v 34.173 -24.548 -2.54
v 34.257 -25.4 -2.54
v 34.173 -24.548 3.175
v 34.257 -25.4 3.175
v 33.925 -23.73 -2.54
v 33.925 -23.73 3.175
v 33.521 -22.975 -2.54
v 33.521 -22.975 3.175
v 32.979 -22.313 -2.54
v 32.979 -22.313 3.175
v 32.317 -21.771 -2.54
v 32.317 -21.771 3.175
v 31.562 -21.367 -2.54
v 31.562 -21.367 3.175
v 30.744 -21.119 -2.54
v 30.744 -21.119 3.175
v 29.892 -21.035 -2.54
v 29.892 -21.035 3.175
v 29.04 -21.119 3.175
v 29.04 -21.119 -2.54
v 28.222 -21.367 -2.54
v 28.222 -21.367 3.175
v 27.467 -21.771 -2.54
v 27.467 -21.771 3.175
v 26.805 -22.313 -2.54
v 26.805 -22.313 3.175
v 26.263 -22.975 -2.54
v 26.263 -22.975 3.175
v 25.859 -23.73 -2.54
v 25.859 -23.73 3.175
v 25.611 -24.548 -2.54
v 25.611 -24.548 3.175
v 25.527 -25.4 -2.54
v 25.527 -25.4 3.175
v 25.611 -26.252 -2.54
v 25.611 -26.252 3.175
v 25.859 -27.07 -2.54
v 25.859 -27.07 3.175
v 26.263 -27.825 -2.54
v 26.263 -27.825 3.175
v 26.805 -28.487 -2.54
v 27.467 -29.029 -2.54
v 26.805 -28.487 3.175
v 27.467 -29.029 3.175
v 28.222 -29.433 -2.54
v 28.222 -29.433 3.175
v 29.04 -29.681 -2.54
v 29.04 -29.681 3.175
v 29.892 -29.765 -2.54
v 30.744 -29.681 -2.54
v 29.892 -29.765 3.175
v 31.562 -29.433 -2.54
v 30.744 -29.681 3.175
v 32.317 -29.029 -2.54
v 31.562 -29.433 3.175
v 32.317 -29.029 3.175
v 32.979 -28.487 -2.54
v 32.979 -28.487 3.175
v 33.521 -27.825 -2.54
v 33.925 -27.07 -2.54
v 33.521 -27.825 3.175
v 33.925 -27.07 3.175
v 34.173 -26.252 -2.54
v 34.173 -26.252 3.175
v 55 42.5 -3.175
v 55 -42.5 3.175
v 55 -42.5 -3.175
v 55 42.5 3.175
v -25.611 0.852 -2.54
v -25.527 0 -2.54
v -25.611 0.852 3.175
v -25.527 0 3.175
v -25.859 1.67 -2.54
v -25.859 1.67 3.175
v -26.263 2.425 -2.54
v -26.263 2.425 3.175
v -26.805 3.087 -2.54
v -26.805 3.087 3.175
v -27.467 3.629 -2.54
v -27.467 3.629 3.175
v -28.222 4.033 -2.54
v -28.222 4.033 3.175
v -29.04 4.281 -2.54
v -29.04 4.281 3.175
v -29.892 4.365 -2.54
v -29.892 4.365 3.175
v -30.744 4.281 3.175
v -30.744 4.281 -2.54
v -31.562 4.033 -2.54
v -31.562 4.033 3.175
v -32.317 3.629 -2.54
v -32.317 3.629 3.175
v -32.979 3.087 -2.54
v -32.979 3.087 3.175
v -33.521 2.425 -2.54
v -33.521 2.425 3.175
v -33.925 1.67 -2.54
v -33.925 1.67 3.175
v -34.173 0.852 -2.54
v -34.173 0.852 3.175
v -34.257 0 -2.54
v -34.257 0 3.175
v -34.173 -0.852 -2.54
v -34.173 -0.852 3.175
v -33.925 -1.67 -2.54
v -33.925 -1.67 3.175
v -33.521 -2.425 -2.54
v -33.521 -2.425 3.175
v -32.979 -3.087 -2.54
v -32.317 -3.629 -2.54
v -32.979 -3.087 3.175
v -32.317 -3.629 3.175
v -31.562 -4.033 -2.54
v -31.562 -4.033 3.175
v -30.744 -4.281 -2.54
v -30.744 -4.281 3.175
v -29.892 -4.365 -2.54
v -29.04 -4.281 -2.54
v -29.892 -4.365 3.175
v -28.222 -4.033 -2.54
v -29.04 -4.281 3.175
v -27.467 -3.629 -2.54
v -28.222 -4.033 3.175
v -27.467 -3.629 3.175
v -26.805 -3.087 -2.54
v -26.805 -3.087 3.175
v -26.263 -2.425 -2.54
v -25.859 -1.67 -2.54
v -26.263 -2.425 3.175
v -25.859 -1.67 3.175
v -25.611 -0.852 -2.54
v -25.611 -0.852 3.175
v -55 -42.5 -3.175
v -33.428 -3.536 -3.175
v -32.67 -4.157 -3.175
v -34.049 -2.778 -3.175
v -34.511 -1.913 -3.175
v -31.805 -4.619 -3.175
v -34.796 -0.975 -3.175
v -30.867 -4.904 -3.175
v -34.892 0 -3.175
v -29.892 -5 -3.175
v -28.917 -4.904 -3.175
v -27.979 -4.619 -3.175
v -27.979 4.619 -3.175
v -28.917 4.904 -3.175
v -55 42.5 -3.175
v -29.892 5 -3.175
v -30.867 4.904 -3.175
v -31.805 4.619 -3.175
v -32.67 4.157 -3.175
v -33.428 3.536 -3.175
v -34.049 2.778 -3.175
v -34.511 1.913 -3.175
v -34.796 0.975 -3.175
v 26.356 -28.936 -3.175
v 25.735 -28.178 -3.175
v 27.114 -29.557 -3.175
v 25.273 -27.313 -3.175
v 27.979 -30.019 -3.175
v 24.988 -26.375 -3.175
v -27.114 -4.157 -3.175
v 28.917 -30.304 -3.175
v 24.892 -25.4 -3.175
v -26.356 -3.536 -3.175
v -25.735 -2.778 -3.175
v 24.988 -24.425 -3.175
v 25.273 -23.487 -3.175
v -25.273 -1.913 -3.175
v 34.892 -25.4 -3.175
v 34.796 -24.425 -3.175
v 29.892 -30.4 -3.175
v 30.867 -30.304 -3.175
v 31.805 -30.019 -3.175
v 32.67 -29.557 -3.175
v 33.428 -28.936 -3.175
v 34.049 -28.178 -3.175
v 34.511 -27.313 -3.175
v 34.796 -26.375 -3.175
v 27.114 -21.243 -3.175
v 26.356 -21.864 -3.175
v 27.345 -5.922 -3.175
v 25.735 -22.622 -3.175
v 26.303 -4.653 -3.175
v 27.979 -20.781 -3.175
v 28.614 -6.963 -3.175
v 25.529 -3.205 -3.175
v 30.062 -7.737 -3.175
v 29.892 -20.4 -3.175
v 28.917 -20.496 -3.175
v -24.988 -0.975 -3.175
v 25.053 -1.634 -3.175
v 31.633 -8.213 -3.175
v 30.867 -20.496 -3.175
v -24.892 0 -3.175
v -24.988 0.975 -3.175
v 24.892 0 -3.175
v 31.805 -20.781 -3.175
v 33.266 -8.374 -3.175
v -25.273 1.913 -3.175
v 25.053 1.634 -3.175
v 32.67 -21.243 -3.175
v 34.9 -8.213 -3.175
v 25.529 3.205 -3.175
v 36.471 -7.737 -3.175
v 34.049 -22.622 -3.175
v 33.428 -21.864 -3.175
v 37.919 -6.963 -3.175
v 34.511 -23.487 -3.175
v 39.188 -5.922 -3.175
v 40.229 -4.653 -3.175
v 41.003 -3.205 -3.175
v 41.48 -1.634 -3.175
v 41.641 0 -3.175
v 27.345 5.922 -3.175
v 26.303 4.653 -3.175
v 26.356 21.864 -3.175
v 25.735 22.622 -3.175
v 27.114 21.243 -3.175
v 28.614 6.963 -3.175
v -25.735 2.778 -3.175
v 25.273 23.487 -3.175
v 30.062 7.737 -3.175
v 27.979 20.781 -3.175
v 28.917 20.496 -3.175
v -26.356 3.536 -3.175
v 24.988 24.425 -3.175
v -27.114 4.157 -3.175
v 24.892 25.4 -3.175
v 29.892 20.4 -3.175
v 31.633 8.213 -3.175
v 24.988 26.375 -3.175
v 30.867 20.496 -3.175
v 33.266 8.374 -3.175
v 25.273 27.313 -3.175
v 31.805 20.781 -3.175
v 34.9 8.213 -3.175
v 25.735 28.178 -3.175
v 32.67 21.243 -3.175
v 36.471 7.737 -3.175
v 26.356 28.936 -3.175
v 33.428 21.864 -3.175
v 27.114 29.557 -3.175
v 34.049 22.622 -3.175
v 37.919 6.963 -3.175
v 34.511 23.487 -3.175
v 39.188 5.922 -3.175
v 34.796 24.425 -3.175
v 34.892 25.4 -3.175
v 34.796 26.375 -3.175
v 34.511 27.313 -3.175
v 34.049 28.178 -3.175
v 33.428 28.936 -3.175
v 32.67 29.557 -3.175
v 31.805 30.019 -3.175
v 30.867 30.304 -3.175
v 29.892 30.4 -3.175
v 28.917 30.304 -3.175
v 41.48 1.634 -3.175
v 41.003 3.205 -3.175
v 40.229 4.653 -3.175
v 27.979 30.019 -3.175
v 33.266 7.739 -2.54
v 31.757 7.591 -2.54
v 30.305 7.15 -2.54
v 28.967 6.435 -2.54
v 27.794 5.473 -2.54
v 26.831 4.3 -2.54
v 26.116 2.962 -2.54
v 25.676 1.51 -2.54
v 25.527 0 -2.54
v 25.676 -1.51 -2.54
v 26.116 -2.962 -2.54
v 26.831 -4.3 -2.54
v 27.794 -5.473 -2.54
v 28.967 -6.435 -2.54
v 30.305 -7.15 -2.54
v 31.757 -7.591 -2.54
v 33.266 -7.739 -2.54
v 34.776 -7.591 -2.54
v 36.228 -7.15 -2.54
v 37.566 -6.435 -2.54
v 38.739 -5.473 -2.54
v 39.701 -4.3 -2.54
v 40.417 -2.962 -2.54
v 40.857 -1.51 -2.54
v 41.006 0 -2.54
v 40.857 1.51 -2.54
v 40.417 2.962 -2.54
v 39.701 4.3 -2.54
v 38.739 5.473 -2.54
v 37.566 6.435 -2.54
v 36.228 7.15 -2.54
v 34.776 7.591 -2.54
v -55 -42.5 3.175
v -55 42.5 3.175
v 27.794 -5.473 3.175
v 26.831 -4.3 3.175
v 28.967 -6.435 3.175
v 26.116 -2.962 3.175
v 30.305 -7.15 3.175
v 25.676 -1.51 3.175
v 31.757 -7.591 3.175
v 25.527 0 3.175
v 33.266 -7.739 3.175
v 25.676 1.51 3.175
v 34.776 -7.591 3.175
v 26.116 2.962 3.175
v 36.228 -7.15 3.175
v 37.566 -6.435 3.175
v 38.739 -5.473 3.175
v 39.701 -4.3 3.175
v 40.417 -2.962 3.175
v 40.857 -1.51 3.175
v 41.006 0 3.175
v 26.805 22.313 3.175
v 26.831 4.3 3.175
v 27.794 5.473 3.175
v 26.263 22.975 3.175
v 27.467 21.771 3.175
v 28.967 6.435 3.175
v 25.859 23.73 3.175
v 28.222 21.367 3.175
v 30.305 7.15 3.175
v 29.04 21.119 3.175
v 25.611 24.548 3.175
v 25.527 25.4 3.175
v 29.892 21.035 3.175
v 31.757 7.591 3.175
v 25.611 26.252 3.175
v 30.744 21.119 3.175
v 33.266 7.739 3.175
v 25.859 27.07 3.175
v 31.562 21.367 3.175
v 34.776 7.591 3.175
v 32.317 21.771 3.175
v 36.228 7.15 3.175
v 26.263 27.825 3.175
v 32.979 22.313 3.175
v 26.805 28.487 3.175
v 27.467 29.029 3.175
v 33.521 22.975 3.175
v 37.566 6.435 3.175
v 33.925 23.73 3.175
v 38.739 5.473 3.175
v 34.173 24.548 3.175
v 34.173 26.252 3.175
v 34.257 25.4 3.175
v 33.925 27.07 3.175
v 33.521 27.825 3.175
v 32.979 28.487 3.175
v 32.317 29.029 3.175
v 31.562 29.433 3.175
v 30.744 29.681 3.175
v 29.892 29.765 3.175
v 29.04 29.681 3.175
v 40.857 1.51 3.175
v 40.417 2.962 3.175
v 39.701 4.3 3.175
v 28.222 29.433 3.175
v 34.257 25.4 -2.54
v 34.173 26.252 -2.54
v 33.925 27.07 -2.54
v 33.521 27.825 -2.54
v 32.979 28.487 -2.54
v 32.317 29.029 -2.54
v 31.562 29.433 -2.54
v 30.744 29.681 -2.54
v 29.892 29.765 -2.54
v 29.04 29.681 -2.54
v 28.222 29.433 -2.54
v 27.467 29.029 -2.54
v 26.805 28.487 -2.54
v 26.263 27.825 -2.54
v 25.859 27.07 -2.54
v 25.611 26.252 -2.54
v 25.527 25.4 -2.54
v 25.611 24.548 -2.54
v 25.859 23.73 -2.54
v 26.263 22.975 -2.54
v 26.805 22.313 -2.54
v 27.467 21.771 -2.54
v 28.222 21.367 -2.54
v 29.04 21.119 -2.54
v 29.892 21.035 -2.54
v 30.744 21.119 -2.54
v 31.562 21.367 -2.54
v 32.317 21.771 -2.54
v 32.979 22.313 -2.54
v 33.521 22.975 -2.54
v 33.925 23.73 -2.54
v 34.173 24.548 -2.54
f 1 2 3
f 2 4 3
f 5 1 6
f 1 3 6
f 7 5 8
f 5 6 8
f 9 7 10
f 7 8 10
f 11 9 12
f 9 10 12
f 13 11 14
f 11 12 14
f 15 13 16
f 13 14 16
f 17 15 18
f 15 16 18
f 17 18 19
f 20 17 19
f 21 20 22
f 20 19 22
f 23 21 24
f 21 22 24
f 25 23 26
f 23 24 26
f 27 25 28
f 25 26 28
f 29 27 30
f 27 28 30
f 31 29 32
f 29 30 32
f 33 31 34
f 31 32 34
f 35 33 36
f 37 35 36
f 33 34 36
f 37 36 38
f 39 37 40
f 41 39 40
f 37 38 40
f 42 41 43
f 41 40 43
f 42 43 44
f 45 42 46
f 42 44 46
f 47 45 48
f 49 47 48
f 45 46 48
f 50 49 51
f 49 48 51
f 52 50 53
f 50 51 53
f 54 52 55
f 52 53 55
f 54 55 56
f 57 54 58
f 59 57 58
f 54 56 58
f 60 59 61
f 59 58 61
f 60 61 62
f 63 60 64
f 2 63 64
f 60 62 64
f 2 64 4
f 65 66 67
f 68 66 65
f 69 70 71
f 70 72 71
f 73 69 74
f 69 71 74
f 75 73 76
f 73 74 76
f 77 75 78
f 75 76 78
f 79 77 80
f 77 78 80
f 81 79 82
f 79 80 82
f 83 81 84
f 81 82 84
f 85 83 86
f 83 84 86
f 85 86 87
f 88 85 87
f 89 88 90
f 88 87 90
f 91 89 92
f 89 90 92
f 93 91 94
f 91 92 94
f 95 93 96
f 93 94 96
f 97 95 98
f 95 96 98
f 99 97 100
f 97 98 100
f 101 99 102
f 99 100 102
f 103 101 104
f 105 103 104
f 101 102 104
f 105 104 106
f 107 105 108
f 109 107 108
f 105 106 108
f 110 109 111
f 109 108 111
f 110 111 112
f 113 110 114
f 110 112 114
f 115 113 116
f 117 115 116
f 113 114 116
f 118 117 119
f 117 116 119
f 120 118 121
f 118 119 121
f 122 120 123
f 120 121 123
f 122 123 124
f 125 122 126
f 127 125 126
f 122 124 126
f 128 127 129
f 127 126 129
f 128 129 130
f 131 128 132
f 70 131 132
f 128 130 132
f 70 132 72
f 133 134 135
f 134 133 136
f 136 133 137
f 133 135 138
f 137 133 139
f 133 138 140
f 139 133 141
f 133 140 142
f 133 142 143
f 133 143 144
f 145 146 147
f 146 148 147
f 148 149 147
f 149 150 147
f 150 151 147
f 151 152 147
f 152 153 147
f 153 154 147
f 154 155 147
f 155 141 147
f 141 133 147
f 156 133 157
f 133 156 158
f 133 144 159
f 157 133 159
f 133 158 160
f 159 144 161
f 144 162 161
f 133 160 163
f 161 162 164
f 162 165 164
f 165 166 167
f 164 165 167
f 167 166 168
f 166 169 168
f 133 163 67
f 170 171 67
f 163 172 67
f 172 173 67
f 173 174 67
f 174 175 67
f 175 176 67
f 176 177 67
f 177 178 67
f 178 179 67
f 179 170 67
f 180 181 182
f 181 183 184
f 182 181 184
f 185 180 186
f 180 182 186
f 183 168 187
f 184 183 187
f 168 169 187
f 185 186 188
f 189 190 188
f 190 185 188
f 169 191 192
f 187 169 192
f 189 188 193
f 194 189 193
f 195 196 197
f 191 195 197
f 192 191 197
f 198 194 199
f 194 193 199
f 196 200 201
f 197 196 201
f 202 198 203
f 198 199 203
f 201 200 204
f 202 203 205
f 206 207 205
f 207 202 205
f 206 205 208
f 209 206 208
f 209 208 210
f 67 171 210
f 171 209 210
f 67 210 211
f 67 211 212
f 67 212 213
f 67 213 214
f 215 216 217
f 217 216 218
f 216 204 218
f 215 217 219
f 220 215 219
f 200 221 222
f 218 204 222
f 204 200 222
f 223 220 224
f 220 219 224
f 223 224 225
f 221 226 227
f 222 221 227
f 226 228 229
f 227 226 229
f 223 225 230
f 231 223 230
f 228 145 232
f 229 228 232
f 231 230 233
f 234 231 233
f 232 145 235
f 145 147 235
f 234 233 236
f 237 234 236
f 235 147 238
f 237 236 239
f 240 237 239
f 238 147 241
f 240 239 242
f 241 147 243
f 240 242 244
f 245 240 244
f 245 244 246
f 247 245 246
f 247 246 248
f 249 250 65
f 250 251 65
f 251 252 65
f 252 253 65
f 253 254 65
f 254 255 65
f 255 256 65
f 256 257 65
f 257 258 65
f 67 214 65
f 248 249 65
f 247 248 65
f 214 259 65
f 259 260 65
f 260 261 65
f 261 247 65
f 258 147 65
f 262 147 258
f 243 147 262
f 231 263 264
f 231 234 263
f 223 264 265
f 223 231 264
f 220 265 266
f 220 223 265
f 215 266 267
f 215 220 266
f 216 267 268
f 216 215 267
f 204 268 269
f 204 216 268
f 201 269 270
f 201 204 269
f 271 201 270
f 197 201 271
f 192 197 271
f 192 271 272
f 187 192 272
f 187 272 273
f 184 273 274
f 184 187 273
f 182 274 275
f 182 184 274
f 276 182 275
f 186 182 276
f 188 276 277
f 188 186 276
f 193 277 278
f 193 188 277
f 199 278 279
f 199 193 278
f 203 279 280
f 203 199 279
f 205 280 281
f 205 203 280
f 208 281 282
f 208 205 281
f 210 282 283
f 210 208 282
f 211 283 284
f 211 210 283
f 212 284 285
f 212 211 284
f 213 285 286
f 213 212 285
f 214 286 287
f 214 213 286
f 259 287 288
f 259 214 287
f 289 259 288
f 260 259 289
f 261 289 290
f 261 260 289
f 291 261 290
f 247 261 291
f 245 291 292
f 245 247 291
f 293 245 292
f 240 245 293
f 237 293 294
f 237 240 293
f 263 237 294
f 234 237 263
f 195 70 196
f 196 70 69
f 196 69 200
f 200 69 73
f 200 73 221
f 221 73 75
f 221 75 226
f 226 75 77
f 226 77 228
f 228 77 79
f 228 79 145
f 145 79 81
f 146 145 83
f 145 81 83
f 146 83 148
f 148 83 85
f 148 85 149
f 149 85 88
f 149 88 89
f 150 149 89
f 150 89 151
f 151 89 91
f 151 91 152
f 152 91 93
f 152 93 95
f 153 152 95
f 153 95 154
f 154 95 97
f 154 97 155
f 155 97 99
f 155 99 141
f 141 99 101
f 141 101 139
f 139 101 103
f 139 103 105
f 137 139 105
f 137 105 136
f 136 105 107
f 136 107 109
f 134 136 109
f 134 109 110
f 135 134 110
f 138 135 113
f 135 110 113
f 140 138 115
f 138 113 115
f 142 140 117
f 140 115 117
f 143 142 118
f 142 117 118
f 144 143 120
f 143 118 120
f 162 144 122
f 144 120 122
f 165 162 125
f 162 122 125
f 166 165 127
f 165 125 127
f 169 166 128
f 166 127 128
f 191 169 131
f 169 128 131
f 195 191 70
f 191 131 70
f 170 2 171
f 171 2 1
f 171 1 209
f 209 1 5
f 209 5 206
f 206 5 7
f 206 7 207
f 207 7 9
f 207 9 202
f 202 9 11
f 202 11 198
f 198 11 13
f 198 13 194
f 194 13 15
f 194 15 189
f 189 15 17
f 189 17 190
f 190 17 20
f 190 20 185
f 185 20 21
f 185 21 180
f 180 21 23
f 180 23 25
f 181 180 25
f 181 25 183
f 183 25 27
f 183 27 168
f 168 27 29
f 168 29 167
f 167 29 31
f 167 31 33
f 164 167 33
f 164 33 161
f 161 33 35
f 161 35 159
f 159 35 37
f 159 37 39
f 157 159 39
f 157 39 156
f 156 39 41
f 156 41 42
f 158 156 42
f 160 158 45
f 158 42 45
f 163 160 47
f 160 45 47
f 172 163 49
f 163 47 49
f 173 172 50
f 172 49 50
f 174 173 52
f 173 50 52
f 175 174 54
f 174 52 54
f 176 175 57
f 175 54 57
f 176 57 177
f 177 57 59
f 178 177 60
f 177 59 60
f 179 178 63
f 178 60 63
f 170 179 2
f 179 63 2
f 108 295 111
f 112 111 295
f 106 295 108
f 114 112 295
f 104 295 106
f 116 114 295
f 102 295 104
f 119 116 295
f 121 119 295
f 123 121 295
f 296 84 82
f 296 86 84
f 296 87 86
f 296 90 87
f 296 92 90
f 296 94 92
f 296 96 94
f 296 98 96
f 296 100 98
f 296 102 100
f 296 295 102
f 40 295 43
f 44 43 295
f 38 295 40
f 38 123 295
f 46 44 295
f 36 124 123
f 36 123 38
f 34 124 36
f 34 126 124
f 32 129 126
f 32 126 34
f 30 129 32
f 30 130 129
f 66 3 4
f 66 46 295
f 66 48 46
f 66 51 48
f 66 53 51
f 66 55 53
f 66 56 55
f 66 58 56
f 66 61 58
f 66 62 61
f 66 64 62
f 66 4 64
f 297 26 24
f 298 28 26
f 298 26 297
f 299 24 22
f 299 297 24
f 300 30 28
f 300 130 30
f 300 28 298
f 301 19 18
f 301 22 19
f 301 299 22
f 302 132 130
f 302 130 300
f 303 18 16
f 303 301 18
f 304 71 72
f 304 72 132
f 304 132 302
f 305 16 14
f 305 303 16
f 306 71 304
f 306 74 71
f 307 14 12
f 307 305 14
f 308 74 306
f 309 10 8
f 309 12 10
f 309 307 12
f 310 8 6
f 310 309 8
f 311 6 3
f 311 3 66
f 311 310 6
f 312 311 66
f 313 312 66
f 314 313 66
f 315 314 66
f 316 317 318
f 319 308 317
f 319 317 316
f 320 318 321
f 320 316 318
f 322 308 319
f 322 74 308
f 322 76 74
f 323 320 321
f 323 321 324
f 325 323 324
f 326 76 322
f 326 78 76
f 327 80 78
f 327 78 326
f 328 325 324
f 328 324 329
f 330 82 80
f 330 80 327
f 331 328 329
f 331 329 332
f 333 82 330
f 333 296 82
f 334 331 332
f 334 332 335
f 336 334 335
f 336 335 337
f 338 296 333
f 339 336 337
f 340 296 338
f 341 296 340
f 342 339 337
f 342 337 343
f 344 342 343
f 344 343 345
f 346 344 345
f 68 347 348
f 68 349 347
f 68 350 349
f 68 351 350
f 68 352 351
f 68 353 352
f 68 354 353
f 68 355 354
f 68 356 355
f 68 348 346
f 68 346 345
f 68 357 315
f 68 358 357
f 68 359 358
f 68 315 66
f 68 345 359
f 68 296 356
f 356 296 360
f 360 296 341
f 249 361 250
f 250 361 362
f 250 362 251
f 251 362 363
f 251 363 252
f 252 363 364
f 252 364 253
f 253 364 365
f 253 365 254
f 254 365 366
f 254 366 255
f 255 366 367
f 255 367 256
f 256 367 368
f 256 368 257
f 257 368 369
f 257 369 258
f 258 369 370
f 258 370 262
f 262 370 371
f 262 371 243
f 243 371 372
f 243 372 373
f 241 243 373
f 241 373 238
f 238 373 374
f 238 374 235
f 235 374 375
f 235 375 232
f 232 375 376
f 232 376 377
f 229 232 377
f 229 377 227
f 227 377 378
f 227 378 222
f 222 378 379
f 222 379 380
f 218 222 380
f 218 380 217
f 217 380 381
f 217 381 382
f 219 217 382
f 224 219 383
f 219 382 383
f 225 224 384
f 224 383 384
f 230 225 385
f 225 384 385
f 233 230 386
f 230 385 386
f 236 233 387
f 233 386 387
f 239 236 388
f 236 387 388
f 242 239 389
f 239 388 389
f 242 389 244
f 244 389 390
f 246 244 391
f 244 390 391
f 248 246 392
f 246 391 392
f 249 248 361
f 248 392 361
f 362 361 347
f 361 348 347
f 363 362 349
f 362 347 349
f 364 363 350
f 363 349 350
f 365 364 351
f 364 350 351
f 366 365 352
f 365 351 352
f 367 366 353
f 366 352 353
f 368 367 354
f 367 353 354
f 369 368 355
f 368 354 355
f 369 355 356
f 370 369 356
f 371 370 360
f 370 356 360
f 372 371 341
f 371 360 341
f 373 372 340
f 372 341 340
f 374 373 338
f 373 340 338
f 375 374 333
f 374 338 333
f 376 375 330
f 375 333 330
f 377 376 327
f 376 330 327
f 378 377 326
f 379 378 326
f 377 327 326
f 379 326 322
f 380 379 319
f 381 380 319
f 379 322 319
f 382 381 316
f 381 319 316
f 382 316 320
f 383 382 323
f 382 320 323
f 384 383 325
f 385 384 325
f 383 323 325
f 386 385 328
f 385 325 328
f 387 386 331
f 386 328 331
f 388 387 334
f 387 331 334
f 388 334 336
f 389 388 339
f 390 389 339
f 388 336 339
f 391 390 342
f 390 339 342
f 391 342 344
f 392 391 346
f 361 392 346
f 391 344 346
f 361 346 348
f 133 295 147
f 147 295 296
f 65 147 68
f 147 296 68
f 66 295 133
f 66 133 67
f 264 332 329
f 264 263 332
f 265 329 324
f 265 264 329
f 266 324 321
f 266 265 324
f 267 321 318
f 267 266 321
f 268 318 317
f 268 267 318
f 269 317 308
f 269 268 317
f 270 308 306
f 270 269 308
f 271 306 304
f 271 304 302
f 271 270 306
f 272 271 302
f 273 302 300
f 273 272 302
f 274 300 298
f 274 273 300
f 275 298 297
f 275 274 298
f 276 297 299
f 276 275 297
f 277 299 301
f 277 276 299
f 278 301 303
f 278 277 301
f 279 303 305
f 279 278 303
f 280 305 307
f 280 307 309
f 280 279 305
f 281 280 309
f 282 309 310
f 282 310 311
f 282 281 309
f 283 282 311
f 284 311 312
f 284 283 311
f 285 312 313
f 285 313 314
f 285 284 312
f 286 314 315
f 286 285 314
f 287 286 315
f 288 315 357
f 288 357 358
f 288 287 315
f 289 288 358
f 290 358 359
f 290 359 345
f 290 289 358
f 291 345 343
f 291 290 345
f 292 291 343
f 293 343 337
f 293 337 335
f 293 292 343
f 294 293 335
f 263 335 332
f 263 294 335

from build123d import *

# Parameters (mm, degrees)
ESQUISSE2_W                        = 110
ESQUISSE2_H                        = 85
BOSS_EXTRU_1_DEPTH                 = 3.175
F_5_16_CLEARANCE_HOLE1_D           = 8.72998
F_5_16_CLEARANCE_HOLE1_CSINK_D     = 9.99998
F_5_16_CLEARANCE_HOLE1_CSINK_ANGLE = 90


with BuildPart() as part:
    # Esquisse2 → Boss.-Extru.1 (new, symmetric)
    with BuildSketch(Plane.XY):
        Rectangle(ESQUISSE2_W, ESQUISSE2_H)
    extrude(amount=BOSS_EXTRU_1_DEPTH, both=True)

    # 5/16 Clearance Hole1 (through all)
    with Locations(Plane(origin=(0, 0, -3.175), x_dir=(-1, 0, 0), z_dir=(0, 0, -1))):
        with Locations((-29.89199, 25.4), (-29.89199, -25.4), (29.89199, 0)):
            CounterSinkHole(F_5_16_CLEARANCE_HOLE1_D / 2, F_5_16_CLEARANCE_HOLE1_CSINK_D / 2, counter_sink_angle=F_5_16_CLEARANCE_HOLE1_CSINK_ANGLE)

    # Sketch4 → 9/16 Clearance Hole1 (revolve, cut)
    with BuildSketch(Plane(origin=(33.26638, 0, -3.175), x_dir=(0, 1, 0), z_dir=(1, 0, 0))):
        Polygon((0, 0), (0, 6.35), (7.73938, 6.35), (7.73938, 0.635), (8.37438, 0), align=None)
    revolve(axis=Axis((33.26638, 0, -9.525), (0, 0, 1)), mode=Mode.SUBTRACT)


solid = part.part
